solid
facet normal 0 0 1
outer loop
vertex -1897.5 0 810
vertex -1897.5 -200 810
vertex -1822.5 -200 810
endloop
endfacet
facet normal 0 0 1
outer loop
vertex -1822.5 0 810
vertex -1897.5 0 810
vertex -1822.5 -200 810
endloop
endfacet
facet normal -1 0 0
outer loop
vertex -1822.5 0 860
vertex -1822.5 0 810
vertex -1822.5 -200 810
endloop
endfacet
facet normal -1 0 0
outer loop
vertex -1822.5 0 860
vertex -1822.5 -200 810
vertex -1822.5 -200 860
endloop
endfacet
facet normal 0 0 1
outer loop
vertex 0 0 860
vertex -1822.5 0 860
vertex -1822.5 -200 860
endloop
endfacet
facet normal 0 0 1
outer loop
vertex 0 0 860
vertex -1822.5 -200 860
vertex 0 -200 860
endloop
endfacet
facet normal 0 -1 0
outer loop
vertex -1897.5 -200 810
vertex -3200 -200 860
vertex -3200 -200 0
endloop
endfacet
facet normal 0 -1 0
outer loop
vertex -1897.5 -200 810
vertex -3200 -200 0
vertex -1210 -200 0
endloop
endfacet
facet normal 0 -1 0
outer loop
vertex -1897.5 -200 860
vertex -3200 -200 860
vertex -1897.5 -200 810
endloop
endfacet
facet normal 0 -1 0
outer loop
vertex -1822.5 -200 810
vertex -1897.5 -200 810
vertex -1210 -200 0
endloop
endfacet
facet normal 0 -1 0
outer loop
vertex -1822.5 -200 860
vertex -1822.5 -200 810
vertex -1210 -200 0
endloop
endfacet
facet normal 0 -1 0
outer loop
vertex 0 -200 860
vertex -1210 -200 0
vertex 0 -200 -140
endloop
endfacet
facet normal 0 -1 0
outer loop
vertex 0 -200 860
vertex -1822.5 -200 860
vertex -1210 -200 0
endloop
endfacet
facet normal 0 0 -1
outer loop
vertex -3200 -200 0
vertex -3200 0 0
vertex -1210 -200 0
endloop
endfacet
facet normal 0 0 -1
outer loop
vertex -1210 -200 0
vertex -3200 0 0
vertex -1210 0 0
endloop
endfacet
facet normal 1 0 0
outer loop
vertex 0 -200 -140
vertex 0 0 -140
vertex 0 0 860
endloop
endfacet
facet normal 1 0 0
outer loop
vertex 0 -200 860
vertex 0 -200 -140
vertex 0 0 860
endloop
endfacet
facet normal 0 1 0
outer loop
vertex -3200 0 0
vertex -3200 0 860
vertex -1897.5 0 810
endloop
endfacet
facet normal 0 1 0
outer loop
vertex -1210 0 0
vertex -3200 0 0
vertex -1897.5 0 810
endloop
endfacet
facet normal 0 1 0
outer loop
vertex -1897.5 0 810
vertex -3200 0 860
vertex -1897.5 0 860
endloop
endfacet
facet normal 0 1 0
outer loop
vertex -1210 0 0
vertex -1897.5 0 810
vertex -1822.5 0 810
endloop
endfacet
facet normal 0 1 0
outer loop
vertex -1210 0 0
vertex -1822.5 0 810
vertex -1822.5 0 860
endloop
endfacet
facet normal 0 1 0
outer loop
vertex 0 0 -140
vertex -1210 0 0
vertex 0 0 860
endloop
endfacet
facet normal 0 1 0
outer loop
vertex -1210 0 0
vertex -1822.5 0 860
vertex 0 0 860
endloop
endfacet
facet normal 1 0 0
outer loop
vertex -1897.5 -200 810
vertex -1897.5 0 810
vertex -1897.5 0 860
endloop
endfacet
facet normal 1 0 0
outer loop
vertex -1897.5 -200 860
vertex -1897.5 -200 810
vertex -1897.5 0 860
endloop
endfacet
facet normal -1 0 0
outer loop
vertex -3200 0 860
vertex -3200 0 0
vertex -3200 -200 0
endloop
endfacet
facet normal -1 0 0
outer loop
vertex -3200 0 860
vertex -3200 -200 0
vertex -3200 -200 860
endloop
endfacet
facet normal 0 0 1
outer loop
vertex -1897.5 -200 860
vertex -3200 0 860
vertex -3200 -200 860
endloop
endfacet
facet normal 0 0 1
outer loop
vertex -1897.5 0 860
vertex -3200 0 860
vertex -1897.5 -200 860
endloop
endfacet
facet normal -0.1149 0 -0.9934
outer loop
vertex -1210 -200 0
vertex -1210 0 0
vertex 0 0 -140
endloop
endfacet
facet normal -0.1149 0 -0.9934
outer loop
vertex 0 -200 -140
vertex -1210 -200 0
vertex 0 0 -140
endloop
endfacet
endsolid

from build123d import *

# Parameters (mm, degrees)
F0_W     = 3200
F0_H     = 860
F1_DEPTH = 200
F3_DEPTH = 200
F4_W     = 75
F4_H     = 50
F5_DEPTH = 200.001


with BuildPart() as f1:
    # F0 (on Front) → F1 (new body)
    with BuildSketch(Plane.XZ):
        with Locations((-1600, 430)):
            Rectangle(F0_W, F0_H)
    extrude(amount=F1_DEPTH)

    # F2 (on Front) → F3 (join, through all)
    with BuildSketch(Plane.XZ):
        Polygon((0, -140), (0, 0), (-1210, 0), align=None)
    extrude(amount=F3_DEPTH)

    # F4 (on Front) → F5 (cut, through all)
    with BuildSketch(Plane.XZ):
        with Locations((-1860, 835)):
            Rectangle(F4_W, F4_H)
    extrude(amount=F5_DEPTH, mode=Mode.SUBTRACT)


solid = f1.part
